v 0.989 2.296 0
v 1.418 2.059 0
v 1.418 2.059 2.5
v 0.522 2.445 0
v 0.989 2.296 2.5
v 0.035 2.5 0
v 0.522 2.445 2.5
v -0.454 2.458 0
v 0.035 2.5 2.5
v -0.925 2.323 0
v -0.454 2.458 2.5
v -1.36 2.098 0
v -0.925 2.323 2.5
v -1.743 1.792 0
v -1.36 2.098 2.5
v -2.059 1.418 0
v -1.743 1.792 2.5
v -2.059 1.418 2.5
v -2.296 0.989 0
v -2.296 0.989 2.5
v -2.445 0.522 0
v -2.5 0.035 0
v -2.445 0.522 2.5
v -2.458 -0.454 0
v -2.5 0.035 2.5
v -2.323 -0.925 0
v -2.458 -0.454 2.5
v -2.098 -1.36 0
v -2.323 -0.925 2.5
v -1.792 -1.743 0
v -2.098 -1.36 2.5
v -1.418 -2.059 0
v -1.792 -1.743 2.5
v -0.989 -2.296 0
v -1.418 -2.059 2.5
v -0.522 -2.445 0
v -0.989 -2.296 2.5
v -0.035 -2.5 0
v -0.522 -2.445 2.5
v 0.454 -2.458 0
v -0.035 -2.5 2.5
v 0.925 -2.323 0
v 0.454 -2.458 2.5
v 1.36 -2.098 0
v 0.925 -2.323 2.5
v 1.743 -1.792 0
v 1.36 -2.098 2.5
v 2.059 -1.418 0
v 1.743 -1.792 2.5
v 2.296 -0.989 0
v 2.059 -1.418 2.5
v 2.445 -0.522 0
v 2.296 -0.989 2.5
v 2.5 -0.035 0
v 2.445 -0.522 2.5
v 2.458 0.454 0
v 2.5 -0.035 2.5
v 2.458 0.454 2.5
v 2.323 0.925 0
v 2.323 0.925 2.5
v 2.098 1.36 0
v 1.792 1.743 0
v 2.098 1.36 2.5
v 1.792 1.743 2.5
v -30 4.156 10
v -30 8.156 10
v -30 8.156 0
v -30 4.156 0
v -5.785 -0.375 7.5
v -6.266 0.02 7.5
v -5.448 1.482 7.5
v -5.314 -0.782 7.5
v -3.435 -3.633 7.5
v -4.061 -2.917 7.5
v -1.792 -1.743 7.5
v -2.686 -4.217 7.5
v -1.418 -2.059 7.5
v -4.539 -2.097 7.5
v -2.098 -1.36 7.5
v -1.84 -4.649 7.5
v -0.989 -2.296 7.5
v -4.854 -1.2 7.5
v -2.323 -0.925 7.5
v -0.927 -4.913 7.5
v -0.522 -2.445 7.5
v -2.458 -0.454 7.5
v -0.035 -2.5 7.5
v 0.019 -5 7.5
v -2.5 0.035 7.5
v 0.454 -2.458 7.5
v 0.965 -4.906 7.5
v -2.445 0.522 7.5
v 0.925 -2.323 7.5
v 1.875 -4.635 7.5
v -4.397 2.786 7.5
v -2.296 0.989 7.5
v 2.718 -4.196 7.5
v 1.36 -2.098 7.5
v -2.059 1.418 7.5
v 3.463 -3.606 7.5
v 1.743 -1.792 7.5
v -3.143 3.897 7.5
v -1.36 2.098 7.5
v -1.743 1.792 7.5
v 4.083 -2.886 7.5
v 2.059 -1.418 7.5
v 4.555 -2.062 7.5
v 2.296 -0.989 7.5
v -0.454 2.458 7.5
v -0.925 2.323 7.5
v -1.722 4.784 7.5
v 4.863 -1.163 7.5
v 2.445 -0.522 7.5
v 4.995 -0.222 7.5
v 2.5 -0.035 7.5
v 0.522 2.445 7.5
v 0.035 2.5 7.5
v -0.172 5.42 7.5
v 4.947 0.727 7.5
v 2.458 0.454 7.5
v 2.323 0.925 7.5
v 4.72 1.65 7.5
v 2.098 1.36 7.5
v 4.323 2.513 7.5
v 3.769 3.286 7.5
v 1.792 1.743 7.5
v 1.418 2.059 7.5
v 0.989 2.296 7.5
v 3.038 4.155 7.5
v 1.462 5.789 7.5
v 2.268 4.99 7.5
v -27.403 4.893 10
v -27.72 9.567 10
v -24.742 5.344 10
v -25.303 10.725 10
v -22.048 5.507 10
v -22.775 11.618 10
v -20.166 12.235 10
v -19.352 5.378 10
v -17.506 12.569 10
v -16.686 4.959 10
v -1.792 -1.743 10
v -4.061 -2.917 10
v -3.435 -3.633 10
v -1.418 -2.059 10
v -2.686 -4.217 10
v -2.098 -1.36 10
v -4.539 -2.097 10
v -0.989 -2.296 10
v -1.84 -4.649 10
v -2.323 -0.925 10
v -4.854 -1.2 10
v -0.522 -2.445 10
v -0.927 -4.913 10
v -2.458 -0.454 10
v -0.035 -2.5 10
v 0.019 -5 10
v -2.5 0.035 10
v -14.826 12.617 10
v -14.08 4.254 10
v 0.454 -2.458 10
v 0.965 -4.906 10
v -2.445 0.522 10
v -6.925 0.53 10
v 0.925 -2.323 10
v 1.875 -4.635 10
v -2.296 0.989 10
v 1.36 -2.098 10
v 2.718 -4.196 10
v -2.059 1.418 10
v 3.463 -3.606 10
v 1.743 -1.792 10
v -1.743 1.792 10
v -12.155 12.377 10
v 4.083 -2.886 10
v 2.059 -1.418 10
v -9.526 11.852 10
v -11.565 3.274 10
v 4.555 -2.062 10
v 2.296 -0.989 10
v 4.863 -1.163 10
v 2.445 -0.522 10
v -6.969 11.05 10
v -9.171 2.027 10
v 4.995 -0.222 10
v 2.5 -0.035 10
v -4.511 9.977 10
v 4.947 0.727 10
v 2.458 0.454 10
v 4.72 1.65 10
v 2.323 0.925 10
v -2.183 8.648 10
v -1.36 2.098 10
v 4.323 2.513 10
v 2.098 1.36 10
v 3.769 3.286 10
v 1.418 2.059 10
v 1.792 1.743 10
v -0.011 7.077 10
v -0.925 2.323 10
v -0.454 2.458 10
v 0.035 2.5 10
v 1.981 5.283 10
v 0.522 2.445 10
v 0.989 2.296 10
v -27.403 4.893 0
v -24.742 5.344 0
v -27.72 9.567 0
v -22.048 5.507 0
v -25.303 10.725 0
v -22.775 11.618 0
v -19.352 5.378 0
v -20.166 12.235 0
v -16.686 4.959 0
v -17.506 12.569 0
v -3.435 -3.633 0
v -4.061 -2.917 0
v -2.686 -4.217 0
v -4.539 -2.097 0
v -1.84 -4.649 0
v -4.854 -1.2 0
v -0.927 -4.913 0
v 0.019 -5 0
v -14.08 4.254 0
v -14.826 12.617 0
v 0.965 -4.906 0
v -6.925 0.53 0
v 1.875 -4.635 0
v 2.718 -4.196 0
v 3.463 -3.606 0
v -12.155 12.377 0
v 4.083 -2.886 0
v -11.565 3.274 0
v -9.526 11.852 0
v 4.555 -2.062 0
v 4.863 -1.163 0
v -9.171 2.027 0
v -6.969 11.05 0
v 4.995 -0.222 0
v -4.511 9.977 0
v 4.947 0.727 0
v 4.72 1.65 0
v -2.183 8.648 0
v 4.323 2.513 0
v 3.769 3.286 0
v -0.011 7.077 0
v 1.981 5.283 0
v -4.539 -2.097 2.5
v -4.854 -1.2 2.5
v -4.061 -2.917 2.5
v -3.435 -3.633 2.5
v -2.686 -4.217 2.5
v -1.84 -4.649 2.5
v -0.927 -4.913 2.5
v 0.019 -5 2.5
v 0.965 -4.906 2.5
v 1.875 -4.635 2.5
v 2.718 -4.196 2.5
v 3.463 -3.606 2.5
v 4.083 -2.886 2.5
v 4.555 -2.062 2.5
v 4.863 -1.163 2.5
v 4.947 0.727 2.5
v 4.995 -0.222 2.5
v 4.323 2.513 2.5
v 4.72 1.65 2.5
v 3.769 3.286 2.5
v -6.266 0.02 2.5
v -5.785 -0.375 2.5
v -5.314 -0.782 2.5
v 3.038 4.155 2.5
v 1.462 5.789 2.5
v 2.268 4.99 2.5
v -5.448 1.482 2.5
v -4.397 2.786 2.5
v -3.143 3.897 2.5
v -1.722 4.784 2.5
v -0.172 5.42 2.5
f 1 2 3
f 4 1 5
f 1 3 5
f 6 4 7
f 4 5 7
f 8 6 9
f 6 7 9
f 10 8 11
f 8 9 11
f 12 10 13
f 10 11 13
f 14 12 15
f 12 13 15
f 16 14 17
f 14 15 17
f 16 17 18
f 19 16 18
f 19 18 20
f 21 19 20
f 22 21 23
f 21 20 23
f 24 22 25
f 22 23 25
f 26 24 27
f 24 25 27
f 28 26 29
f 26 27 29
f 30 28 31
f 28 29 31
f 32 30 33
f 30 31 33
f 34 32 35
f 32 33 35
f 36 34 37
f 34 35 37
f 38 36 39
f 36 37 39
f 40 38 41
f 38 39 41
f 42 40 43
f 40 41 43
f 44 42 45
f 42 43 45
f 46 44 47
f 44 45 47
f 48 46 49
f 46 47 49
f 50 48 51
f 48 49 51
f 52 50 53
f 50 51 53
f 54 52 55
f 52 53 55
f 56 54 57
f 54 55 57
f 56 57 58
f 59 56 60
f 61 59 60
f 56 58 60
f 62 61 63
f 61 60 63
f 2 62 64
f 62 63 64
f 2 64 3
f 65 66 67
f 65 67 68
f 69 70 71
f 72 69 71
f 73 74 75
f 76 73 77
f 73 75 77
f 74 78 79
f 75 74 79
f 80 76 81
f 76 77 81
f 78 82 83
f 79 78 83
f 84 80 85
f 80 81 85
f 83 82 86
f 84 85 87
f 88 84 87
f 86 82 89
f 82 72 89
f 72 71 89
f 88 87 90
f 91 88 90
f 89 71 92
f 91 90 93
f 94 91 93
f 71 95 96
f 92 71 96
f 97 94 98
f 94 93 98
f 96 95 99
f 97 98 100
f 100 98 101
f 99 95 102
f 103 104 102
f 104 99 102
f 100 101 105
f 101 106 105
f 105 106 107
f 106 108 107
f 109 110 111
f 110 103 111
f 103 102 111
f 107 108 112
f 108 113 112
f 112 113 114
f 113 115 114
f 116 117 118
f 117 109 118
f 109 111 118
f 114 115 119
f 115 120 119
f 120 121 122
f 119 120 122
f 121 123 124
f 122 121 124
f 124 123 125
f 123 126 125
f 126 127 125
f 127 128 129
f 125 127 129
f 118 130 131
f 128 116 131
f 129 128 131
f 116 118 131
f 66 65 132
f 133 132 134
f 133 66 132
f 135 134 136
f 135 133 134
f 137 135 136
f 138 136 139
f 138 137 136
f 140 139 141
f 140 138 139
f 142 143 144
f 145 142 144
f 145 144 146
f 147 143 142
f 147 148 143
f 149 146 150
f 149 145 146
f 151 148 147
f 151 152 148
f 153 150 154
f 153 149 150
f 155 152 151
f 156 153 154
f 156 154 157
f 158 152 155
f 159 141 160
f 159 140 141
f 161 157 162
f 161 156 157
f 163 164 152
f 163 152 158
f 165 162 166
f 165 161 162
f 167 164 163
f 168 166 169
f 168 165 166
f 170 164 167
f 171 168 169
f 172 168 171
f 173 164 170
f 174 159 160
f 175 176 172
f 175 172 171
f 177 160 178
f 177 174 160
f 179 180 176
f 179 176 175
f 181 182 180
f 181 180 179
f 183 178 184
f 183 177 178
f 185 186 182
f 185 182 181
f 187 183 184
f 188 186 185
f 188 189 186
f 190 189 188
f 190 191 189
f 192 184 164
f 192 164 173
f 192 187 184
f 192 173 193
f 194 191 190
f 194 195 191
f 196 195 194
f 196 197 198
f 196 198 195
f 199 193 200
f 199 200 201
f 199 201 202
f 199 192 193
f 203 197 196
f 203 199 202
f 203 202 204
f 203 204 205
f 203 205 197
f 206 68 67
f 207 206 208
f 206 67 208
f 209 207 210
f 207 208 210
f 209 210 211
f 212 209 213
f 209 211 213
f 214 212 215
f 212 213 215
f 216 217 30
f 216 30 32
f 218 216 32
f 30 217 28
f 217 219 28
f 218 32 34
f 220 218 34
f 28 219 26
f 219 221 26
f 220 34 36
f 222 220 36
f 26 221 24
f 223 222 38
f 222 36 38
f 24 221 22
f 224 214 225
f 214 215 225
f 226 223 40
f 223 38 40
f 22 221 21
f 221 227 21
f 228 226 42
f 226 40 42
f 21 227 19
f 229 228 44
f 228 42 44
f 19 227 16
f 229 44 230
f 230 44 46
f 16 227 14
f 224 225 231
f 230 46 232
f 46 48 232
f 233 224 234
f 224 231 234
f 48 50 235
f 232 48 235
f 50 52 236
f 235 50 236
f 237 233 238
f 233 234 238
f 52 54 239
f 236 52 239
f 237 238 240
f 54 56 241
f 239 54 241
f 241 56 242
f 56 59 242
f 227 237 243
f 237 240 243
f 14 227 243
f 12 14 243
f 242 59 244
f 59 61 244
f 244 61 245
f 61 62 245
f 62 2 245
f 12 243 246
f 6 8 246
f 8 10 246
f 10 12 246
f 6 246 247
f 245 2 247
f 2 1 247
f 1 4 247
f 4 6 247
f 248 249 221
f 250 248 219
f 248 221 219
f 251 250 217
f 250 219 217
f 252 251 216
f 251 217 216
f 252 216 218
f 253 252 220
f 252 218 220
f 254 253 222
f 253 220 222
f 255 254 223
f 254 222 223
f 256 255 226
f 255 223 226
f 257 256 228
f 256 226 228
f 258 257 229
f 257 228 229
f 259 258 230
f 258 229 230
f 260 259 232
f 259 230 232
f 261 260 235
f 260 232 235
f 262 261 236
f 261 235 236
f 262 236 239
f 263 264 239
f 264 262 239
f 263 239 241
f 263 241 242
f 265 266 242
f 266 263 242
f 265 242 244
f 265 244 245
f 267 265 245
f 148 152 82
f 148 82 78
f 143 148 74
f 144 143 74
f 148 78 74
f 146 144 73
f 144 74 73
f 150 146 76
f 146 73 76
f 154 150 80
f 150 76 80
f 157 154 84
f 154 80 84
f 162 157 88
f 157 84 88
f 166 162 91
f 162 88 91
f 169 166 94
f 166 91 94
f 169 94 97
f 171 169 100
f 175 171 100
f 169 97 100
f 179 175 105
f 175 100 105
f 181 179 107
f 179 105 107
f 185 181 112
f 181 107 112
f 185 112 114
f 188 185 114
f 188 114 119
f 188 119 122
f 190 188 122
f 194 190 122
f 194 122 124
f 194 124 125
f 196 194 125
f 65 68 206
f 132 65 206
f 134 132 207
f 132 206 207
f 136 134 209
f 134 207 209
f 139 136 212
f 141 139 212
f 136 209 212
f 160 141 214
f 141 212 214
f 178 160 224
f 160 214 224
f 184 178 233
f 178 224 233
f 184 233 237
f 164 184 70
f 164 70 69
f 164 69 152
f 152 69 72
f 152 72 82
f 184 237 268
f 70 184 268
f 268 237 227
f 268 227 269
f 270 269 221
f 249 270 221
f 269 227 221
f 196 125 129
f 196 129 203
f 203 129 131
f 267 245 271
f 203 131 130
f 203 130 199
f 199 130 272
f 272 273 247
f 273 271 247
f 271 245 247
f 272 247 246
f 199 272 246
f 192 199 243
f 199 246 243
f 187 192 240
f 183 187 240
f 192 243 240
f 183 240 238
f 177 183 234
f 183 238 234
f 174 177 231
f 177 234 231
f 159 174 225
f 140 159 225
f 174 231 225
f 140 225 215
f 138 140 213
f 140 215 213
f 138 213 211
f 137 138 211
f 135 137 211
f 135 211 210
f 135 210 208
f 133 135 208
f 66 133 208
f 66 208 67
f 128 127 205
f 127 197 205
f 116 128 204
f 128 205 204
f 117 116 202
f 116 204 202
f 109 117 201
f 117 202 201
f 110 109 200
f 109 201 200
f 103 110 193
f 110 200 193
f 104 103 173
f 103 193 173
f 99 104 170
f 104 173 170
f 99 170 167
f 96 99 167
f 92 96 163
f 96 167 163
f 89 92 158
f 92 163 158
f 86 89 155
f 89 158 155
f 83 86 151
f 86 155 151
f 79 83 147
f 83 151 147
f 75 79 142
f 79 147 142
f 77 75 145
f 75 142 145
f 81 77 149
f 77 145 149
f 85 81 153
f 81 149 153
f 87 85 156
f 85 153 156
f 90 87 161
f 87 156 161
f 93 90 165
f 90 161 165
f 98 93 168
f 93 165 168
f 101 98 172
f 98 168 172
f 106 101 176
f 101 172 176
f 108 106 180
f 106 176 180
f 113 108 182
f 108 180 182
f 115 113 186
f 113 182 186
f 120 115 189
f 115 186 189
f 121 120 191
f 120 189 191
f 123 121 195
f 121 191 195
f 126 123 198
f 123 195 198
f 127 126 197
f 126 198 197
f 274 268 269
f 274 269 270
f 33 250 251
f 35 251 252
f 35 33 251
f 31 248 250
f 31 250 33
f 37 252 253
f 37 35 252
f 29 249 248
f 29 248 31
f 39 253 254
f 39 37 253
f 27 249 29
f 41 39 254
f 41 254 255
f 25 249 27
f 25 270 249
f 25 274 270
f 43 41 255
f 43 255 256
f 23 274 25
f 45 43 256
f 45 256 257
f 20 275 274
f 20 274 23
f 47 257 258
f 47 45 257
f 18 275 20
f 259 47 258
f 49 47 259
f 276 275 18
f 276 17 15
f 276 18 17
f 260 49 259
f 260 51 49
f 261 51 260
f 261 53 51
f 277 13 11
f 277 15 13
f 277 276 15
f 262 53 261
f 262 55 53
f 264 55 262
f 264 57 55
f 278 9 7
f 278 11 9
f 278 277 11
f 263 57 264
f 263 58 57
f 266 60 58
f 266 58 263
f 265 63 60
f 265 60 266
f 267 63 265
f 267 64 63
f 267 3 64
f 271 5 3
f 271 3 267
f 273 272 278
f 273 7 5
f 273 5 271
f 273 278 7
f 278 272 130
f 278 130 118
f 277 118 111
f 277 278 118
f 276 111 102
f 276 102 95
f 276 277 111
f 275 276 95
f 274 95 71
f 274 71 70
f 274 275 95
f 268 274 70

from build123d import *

# Parameters (mm, degrees)
SKETCH1_R               = 5
BOSS_EXTRUDE1_DEPTH     = 10
SKETCH2_R               = 2.5
CUT_EXTRUDE1_DEPTH      = 13.247448714
BOSS_EXTRUDE2_DEPTH     = 10
SKETCH7_R               = 2.5
CUT_EXTRUDE2_DEPTH      = 35.052803759
CUT_EXTRUDE4_DEPTH      = 2.5
CUT_EXTRUDE4_DEPTH_BACK = 2.5
SKETCH15_R              = 10


with BuildPart() as part:
    # Sketch1 → Boss-Extrude1 (new body)
    with BuildSketch(Plane.XY):
        Circle(SKETCH1_R)
    extrude(amount=BOSS_EXTRUDE1_DEPTH)

    # Sketch2 → Cut-Extrude1 (cut, through all)
    with BuildSketch(Plane.XY.offset(10)):
        Circle(SKETCH2_R)
    extrude(amount=-CUT_EXTRUDE1_DEPTH, mode=Mode.SUBTRACT)

    # Sketch6 → Boss-Extrude2 (add)
    with BuildSketch(Plane.XY):
        with BuildLine():
            Line((-30, 8.156486671), (-30, 4.156486671))
            ThreePointArc((-30, 4.156486671), (-16.68023923, 4.957359729), (-4.845860122, -1.207451361))
            Line((-4.845860122, -1.207451361), (3.769015533, 3.285501775))
            ThreePointArc((3.769015533, 3.285501775), (-12.155410699, 12.376939364), (-30, 8.156486671))
        make_face()
    extrude(amount=BOSS_EXTRUDE2_DEPTH)

    # Sketch7 → Cut-Extrude2 (cut, through all)
    with BuildSketch(Plane.XY.offset(10)):
        Circle(SKETCH7_R)
    extrude(amount=-CUT_EXTRUDE2_DEPTH, mode=Mode.SUBTRACT)

    # Sketch15 → Cut-Extrude4 (cut, two sides: drawn at the far end of the back side and taken through both)
    with BuildSketch(Plane.XY.offset(5).offset(-CUT_EXTRUDE4_DEPTH_BACK)):
        with Locations((2.839216425, -4.115683429)):
            Circle(SKETCH15_R)
    extrude(amount=CUT_EXTRUDE4_DEPTH + CUT_EXTRUDE4_DEPTH_BACK, mode=Mode.SUBTRACT)


solid = part.part
